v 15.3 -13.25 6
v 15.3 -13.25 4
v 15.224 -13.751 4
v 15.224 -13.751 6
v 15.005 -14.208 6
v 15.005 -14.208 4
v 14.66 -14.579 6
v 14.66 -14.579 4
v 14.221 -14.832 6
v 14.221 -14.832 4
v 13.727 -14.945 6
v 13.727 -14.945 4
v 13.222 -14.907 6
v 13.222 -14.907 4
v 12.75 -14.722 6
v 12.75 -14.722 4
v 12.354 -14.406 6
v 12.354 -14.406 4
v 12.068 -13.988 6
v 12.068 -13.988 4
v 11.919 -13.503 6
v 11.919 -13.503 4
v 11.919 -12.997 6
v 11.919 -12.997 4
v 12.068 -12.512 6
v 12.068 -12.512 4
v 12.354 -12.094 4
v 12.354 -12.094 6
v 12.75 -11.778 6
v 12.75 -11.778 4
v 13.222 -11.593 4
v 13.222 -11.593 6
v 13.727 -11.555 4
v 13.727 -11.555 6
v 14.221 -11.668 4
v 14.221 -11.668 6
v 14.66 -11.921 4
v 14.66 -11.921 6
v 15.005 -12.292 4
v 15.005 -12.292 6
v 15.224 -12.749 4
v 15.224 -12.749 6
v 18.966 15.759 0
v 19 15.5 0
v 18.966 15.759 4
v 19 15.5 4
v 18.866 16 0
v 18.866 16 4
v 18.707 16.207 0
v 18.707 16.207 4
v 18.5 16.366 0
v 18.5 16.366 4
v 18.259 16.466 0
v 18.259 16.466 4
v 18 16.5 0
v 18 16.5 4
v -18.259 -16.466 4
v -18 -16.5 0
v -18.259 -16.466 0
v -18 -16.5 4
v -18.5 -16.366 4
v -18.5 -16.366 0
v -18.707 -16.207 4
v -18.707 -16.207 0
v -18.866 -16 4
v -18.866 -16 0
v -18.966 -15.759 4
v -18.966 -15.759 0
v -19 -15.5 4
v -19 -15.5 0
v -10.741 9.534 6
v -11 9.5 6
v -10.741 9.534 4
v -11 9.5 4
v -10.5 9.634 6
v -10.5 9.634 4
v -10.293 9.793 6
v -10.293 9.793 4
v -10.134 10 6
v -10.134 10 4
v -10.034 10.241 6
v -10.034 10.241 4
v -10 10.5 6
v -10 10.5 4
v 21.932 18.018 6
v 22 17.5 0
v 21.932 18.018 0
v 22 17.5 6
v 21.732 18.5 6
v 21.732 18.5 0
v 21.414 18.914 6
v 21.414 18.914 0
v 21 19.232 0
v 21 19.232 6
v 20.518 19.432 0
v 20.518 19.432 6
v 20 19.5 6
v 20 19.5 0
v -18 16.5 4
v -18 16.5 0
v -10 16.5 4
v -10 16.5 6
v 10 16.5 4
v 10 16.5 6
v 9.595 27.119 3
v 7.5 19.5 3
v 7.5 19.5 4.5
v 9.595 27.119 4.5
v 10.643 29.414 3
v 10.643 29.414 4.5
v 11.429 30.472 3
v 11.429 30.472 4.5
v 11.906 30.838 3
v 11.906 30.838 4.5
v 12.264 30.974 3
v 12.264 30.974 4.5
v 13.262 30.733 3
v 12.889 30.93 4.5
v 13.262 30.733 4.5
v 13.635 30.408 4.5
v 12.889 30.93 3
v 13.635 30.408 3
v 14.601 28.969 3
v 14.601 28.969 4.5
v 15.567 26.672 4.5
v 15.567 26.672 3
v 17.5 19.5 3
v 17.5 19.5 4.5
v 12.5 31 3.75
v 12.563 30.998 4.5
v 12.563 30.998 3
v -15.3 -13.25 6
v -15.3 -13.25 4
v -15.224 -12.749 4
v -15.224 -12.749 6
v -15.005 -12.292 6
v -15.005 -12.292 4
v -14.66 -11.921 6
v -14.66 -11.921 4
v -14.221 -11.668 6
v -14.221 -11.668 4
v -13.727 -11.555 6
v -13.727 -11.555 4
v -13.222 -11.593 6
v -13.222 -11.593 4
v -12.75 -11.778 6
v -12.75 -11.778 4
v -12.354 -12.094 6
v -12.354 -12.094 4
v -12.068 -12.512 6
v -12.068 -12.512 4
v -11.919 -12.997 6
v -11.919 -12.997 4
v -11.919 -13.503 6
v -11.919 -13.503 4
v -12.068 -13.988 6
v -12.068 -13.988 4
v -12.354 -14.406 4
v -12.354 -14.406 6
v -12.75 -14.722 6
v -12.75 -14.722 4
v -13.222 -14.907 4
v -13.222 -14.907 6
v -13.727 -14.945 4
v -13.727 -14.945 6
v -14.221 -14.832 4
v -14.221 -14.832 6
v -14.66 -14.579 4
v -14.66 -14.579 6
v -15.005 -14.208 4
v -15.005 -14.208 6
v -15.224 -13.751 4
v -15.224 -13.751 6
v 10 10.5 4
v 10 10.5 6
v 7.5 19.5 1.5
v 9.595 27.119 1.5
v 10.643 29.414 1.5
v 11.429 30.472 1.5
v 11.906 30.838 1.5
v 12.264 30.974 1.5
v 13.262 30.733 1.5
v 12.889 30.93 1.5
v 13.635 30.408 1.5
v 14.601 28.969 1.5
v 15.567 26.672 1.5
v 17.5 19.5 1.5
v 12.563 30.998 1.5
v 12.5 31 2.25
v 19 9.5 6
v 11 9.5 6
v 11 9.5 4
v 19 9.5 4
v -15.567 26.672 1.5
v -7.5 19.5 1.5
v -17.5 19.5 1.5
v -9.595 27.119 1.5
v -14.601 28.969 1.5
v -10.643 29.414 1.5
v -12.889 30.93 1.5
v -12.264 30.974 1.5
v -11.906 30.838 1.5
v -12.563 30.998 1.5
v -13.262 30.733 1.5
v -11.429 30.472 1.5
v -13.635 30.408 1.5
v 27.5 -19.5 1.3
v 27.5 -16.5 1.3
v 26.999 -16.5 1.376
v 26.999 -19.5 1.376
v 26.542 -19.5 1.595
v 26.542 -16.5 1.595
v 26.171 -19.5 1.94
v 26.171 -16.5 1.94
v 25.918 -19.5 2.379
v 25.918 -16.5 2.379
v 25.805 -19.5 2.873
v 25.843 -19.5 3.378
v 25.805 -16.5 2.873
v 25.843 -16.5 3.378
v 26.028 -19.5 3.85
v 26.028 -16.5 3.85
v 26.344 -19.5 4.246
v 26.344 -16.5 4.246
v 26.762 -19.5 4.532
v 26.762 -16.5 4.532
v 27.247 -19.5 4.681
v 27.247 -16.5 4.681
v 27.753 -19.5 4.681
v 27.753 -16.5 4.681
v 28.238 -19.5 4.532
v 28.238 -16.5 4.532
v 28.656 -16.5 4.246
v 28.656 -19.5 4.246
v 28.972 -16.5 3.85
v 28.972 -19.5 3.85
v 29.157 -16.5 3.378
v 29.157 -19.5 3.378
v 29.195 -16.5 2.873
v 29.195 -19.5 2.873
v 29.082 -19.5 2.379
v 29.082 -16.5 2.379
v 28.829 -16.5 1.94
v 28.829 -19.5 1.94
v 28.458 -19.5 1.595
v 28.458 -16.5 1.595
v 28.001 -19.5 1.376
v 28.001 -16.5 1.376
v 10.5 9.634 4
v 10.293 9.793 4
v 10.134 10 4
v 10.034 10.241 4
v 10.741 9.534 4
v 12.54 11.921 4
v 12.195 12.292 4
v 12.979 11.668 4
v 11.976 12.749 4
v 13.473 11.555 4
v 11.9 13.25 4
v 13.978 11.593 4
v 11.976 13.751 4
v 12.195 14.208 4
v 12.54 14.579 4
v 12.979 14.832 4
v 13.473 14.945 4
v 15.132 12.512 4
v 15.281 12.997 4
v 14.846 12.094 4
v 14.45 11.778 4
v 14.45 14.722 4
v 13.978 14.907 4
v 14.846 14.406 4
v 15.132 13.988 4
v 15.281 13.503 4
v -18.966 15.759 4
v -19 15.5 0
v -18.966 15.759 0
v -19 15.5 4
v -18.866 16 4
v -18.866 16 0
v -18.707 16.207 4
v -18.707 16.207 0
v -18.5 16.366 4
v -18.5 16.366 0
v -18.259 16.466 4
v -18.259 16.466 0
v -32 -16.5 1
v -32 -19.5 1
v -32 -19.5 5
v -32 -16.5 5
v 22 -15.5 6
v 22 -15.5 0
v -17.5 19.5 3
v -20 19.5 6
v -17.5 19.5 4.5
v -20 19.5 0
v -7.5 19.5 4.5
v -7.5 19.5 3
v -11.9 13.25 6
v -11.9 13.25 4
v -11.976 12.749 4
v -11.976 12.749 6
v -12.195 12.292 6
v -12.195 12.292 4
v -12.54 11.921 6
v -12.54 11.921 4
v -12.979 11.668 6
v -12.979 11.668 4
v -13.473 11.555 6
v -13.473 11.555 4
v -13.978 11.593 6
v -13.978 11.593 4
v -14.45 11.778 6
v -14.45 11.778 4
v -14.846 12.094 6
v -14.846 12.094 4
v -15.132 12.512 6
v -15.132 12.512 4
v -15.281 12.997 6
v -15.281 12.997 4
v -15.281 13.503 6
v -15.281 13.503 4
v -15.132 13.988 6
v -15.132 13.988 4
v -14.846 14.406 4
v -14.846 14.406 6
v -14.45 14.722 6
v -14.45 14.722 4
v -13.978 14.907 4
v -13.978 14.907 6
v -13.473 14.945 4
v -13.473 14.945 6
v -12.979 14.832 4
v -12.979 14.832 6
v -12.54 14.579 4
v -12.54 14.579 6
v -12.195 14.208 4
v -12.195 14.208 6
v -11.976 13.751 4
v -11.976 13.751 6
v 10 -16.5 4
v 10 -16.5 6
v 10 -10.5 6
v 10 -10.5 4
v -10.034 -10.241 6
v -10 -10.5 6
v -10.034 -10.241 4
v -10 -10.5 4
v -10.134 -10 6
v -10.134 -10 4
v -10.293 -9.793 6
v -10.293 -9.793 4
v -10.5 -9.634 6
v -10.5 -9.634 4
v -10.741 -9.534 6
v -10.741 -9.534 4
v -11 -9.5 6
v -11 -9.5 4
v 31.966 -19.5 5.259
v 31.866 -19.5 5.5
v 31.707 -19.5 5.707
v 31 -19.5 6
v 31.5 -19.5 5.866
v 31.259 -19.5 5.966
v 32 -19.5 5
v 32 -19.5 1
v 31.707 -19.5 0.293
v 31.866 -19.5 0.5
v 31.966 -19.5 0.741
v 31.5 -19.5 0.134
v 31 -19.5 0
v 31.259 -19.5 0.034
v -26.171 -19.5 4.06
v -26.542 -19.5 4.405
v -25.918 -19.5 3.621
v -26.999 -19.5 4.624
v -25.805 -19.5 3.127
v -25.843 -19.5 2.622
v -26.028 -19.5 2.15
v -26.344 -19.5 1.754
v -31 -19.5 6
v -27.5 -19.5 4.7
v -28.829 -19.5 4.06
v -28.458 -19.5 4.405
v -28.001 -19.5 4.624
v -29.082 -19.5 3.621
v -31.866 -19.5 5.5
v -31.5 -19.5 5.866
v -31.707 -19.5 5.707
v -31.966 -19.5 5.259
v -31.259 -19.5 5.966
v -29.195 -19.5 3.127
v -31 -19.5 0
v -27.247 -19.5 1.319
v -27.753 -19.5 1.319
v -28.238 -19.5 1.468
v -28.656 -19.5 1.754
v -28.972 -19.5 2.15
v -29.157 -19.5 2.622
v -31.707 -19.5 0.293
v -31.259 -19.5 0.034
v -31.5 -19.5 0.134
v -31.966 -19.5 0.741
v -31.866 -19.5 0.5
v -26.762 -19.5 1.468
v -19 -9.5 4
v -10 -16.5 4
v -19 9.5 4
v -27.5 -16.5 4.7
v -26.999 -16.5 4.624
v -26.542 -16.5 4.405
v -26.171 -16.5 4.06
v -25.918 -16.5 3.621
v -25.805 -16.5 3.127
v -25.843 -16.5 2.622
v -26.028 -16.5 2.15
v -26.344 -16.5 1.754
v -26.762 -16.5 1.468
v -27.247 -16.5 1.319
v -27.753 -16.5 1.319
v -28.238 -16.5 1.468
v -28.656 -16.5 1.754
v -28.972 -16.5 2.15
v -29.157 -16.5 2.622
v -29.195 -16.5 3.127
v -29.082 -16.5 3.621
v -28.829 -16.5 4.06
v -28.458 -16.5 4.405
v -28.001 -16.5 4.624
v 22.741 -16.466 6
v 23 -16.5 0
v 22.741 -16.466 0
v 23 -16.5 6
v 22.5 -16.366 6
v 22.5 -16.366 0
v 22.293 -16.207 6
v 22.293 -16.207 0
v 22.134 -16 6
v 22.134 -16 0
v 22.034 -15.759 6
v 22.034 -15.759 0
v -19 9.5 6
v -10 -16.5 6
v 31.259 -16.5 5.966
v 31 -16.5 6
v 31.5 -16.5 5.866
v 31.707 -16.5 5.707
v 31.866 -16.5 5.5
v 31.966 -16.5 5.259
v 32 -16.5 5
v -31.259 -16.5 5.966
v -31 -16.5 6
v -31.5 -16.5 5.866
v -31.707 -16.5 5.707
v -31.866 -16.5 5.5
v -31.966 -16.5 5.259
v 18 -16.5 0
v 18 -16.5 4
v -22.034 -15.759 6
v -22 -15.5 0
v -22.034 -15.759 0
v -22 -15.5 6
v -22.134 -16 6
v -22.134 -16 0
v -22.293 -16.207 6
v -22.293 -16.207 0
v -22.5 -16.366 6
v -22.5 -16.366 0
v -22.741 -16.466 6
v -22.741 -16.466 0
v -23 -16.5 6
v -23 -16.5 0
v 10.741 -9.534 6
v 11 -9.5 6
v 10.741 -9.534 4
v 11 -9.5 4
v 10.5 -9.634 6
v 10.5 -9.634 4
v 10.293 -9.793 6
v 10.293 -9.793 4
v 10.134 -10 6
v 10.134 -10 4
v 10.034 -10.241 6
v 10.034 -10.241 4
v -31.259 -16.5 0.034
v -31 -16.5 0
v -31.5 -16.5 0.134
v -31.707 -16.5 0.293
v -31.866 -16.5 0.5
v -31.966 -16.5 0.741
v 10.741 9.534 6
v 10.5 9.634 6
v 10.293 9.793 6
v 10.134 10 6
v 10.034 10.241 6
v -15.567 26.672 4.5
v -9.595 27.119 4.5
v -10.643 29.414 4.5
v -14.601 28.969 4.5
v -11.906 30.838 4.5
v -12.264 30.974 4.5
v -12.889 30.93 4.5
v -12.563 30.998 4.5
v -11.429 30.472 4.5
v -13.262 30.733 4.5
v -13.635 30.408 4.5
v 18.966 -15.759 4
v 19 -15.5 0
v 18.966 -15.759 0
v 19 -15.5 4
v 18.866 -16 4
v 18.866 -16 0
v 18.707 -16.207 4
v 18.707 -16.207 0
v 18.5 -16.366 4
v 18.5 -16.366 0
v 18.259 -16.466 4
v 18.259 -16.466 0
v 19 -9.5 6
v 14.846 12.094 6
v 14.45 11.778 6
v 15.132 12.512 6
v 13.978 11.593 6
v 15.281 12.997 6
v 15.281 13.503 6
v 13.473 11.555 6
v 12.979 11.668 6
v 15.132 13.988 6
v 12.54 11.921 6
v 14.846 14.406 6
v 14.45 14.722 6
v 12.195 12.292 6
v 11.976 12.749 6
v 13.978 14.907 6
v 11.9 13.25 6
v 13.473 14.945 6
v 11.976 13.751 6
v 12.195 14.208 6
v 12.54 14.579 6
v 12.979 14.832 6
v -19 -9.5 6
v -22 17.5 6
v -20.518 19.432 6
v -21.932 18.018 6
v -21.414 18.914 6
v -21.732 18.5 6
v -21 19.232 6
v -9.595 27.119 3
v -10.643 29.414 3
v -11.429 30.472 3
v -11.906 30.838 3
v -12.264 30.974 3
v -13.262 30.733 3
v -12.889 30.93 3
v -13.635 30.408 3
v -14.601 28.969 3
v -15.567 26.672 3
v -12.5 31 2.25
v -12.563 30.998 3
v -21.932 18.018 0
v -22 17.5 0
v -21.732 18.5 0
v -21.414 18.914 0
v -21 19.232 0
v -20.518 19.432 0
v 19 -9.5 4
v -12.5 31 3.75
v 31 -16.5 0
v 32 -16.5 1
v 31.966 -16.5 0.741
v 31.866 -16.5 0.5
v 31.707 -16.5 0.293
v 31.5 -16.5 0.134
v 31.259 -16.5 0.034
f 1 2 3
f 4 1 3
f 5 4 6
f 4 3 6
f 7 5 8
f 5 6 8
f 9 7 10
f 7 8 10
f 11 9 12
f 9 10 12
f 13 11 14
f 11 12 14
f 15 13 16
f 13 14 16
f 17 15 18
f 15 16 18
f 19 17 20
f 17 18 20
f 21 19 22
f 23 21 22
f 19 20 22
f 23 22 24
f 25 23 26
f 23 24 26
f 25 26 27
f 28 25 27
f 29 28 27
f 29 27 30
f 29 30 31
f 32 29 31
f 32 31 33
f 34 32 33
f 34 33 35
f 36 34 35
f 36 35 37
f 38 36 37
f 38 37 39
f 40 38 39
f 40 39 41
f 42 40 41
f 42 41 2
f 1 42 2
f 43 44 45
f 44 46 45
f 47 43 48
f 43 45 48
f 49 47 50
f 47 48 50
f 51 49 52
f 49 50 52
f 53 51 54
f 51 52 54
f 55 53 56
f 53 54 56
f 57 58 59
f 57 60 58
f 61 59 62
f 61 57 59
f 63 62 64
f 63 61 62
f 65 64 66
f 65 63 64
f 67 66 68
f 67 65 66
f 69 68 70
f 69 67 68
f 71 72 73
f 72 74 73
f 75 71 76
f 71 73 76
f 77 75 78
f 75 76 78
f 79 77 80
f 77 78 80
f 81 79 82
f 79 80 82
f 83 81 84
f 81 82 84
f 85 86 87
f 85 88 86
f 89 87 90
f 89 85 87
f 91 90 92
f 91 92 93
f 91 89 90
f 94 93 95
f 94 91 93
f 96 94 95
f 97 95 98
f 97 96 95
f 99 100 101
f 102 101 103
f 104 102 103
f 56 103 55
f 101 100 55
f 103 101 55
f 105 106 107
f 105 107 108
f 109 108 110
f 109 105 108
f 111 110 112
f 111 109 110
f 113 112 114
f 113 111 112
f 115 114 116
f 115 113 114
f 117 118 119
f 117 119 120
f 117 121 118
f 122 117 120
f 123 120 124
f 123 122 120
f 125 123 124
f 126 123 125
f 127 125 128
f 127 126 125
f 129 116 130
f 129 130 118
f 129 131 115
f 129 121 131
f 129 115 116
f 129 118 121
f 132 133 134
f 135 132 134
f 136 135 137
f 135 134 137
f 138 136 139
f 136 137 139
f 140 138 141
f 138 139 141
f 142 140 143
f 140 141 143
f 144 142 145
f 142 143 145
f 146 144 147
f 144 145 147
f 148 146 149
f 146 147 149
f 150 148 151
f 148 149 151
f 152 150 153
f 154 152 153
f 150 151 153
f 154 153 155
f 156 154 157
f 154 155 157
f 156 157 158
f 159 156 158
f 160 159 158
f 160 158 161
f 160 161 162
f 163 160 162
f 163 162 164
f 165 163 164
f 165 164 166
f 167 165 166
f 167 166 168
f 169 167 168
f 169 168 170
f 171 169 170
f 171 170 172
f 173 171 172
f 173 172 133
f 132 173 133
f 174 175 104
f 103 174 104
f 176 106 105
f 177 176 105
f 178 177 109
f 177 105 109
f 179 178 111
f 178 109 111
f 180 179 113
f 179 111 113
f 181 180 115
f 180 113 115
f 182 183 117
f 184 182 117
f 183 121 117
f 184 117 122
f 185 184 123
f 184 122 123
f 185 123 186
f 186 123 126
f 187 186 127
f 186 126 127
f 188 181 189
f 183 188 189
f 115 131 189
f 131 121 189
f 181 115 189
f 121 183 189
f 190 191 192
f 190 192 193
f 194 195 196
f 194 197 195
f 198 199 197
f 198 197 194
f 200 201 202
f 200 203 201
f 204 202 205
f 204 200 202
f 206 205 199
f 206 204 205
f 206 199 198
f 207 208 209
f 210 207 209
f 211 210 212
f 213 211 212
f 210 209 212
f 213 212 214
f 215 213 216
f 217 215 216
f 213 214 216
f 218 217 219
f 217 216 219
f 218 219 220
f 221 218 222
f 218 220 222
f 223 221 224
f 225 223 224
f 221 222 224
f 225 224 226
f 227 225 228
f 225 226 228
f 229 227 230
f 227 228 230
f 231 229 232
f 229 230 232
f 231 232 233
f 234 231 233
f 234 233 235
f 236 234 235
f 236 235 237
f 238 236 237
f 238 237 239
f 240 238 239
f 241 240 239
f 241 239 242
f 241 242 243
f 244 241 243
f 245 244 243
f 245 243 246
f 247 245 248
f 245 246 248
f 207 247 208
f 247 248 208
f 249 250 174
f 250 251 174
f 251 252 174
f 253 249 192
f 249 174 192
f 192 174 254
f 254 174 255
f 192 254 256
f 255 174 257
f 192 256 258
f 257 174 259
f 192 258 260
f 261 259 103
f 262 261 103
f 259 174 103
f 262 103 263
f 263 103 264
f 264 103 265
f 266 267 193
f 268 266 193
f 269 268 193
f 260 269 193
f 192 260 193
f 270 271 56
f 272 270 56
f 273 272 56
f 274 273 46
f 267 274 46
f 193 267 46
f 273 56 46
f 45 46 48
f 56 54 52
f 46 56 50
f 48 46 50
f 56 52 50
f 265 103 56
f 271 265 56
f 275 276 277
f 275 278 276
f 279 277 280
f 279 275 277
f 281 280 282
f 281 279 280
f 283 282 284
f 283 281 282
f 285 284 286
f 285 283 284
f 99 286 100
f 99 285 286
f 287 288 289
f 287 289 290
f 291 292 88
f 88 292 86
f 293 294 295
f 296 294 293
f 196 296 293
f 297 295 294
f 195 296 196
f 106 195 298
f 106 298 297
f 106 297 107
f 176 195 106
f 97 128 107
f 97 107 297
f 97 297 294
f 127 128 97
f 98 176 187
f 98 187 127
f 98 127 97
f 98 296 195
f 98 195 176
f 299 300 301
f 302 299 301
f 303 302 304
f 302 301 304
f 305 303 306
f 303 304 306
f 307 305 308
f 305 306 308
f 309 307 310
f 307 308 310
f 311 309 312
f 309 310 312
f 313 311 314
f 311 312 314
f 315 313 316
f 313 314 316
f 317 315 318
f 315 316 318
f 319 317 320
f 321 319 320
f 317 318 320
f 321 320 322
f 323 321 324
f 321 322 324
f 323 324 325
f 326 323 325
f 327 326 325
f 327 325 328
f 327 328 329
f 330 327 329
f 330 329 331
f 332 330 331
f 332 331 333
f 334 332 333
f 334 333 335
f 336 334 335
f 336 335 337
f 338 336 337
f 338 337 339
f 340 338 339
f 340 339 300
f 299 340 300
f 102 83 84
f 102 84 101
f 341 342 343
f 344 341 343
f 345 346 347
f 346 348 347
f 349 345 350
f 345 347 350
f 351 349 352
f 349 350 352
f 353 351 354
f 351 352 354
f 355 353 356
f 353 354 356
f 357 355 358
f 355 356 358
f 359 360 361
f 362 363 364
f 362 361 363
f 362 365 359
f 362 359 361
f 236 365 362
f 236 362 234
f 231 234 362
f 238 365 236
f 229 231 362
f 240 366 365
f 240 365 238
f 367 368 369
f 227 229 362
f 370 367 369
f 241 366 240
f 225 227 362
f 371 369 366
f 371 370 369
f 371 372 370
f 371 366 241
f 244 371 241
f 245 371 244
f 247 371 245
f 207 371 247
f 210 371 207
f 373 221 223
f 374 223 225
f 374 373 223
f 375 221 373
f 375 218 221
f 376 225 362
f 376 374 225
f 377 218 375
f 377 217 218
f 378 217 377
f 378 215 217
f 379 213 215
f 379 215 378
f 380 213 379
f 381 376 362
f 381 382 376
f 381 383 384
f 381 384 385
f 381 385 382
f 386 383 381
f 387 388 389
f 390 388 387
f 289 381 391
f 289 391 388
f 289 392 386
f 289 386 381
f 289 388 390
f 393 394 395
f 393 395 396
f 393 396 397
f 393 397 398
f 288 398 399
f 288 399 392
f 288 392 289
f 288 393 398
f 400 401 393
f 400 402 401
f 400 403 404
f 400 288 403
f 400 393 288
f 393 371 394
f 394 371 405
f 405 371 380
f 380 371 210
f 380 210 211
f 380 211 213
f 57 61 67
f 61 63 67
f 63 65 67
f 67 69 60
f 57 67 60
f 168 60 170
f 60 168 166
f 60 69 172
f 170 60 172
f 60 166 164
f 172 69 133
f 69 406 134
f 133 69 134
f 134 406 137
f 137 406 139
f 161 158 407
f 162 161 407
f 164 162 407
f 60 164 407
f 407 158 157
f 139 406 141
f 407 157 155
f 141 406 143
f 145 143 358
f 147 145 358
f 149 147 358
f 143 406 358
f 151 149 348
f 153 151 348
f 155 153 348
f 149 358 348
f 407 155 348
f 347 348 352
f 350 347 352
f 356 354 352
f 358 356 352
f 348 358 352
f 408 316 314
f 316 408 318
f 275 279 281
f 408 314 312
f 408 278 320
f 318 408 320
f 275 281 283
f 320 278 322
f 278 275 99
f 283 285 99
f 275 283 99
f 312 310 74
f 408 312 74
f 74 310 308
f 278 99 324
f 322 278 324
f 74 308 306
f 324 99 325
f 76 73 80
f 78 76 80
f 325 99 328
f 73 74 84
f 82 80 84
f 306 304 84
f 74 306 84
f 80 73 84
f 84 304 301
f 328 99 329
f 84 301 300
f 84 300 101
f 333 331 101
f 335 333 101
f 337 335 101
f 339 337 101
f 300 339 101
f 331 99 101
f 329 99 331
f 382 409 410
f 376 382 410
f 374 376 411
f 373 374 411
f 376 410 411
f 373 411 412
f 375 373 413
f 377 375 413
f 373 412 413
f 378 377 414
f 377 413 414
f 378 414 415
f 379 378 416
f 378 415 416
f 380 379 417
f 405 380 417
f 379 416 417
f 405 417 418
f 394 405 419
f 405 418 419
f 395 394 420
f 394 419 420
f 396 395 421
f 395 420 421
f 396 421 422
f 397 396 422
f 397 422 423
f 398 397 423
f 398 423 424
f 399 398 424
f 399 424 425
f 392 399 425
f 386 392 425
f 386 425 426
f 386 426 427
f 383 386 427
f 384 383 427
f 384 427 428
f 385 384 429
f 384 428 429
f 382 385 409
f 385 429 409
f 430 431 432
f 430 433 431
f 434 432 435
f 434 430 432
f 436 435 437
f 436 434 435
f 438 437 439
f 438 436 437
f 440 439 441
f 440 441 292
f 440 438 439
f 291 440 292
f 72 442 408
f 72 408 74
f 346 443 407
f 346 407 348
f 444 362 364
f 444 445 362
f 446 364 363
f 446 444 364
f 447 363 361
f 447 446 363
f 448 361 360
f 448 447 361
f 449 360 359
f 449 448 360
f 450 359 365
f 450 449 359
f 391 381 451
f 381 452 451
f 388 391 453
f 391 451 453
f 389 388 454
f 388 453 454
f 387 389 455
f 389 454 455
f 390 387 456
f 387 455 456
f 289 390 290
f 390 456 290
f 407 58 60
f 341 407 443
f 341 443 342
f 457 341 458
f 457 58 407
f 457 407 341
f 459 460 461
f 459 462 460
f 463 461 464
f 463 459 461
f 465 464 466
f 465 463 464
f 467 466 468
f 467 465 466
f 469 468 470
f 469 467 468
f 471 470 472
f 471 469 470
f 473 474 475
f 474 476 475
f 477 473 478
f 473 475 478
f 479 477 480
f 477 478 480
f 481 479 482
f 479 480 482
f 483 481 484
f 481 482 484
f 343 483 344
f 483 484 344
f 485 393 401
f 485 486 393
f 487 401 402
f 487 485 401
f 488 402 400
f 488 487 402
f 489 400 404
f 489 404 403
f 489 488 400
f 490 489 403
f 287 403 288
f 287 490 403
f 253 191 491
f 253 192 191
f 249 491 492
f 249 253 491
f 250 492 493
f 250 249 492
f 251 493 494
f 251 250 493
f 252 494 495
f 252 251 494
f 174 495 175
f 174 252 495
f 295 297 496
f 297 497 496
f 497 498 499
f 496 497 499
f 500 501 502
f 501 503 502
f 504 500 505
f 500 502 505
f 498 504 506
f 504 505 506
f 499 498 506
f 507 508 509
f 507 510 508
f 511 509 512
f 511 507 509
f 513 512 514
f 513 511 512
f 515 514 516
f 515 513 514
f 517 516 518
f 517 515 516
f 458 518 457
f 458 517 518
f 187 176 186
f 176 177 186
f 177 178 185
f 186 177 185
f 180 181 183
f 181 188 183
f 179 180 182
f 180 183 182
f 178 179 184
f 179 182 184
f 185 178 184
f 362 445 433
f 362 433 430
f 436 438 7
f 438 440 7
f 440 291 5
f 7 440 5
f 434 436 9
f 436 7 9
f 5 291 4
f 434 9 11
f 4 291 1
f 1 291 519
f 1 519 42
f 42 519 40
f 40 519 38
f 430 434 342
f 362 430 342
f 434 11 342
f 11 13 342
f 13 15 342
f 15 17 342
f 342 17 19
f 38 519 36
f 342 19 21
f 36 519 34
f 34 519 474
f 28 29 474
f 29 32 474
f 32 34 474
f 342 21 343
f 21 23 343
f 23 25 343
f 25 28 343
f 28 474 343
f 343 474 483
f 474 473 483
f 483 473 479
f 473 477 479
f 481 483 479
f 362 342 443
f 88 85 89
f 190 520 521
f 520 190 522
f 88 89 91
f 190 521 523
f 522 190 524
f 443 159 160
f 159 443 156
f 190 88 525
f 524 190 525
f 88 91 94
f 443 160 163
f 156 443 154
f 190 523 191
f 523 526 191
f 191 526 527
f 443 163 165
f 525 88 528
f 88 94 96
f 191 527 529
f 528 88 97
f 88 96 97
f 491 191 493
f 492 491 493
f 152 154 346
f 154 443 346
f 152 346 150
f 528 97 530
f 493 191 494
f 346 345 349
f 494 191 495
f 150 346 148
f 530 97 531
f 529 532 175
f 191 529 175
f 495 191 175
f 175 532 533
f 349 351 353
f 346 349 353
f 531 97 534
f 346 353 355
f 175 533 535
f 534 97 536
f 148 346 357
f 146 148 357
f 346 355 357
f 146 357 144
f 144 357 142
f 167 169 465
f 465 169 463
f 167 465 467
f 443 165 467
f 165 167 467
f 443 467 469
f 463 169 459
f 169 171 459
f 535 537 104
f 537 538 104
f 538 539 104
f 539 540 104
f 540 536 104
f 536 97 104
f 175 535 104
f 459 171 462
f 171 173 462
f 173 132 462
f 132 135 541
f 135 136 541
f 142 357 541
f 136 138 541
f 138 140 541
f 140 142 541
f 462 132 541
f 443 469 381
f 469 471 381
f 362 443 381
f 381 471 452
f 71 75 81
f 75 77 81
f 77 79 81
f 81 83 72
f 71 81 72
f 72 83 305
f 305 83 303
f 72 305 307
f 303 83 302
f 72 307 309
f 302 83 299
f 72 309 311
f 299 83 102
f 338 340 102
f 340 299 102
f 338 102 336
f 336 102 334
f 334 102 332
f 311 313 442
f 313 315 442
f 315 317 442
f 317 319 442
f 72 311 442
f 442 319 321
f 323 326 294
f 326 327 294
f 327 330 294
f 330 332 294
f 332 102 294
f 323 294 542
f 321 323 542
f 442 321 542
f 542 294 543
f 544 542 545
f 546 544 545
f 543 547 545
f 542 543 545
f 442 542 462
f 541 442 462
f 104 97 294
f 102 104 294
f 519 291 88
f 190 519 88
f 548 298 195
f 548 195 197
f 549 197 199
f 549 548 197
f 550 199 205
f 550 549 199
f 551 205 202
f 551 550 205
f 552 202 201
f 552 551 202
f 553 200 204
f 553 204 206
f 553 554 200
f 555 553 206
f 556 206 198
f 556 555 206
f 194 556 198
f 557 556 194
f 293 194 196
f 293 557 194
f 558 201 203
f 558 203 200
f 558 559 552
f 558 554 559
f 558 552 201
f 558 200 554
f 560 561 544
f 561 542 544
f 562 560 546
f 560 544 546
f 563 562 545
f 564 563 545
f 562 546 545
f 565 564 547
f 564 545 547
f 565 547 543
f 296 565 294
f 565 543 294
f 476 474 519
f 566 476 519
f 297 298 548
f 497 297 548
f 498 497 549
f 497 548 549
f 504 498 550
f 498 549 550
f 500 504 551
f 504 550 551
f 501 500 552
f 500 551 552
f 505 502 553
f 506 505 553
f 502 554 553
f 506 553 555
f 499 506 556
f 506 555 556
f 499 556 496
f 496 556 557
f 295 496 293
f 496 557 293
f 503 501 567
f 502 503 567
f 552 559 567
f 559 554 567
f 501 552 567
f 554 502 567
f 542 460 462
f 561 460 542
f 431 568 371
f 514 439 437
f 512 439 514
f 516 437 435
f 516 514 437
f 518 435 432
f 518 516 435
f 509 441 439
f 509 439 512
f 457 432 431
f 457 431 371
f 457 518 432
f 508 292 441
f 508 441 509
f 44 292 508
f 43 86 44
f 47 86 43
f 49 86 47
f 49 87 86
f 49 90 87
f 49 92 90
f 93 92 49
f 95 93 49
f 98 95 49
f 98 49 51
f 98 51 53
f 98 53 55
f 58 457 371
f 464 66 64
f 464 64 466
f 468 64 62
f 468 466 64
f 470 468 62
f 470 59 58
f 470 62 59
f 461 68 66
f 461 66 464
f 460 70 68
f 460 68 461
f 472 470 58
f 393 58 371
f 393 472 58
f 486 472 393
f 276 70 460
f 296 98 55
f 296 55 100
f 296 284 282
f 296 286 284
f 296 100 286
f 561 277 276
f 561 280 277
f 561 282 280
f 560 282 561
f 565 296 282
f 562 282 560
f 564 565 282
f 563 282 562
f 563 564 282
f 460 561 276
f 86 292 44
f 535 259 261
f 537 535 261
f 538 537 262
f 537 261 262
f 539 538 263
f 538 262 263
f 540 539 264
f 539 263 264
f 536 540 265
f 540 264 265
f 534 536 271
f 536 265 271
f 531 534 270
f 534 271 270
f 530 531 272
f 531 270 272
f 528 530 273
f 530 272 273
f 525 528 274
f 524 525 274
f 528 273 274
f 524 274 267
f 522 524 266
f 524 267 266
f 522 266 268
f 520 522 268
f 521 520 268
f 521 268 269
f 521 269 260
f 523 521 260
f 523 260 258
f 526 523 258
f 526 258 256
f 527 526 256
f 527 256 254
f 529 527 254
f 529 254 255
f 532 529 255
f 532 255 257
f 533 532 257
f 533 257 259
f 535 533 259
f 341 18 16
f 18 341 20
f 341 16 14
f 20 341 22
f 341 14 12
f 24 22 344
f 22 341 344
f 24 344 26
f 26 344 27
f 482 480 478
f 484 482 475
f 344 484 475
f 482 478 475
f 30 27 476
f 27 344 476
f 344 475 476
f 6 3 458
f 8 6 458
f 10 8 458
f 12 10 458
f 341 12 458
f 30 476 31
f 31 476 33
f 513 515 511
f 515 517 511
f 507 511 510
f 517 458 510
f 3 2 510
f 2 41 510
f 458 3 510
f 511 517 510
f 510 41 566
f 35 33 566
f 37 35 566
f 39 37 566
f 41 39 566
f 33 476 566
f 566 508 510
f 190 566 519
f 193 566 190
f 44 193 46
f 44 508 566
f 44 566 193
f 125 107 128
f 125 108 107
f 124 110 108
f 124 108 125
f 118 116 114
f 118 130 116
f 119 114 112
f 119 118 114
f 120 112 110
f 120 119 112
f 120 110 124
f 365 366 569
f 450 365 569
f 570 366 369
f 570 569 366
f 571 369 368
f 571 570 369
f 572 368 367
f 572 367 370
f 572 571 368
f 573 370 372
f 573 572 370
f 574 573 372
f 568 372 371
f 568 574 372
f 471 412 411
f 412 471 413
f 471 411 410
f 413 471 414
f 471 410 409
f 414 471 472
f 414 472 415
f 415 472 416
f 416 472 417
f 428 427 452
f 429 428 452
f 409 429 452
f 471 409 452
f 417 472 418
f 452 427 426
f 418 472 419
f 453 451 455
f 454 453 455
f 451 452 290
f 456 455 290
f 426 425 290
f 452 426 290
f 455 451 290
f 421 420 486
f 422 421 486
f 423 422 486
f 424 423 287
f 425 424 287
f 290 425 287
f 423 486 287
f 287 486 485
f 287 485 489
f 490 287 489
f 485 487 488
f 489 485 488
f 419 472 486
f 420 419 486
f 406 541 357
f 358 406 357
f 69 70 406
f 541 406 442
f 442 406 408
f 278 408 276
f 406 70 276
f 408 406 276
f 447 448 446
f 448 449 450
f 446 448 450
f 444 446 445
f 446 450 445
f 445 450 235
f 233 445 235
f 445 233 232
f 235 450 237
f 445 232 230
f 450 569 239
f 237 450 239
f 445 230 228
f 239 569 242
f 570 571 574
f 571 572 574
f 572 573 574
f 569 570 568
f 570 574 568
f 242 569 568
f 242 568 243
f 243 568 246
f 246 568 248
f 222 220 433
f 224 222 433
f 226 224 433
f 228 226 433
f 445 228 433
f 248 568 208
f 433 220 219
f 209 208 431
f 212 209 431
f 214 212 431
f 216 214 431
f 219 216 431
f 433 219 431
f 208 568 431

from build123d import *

# Parameters (mm, degrees)
SKETCH_1_W          = 44
SKETCH_1_H          = 39
SKETCH_1_W_2        = 38
SKETCH_1_H_2        = 33
EXTRUDE_1_DEPTH     = 6
SKETCH_2_W          = 9
SKETCH_2_H          = 7
EXTRUDE_2_DEPTH     = 2
SKETCH_3_R          = 1.7
CUT_EXTRUDE_1_DEPTH = 30.669007398
EXTRUDE_3_DEPTH     = 1.5
SKETCH_5_W          = 10
SKETCH_5_H          = 3
EXTRUDE_4_DEPTH     = 6
FILLET_3_R          = 1
FILLET_4_R          = 2
SKETCH_6_R          = 1.7
CUT_EXTRUDE_2_DEPTH = 3


with BuildPart() as part:
    # 草图1 → 凸台-拉伸1 (new body)
    with BuildSketch(Plane.XY):
        Rectangle(SKETCH_1_W, SKETCH_1_H)
        Rectangle(SKETCH_1_W_2, SKETCH_1_H_2, mode=Mode.SUBTRACT)
    extrude(amount=EXTRUDE_1_DEPTH)

    # 草图2 → 凸台-拉伸2 (add)
    with BuildSketch(Plane.XY.offset(6)):
        with Locations((14.5, 13)):
            Rectangle(SKETCH_2_W, SKETCH_2_H)
        with Locations((-14.5, 13)):
            Rectangle(SKETCH_2_W, SKETCH_2_H)
        with Locations((-14.5, -13)):
            Rectangle(SKETCH_2_W, SKETCH_2_H)
        with Locations((14.5, -13)):
            Rectangle(SKETCH_2_W, SKETCH_2_H)
    extrude(amount=-EXTRUDE_2_DEPTH)

    # 草图3 → 切除-拉伸1 (cut, through all)
    with BuildSketch(Plane(origin=(0, 0, 4), x_dir=(-1, 0, 0), z_dir=(0, 0, -1))):
        with Locations((-13.6, 13.25)):
            Circle(SKETCH_3_R)
        with Locations(Location((13.6, 13.25, 0), (0, 0, 180))):
            Circle(SKETCH_3_R)
        with Locations((13.6, -13.25)):
            Circle(SKETCH_3_R)
        with Locations(Location((-13.6, -13.25, 0), (0, 0, 180))):
            Circle(SKETCH_3_R)
    extrude(amount=-CUT_EXTRUDE_1_DEPTH, mode=Mode.SUBTRACT)

    # 草图4 → 凸台-拉伸3 (add, symmetric)
    with BuildSketch(Plane(origin=(0, 0, 3), x_dir=(-1, 0, 0), z_dir=(0, 0, -1))):
        with BuildLine():
            Line((7.5, 19.5), (17.5, 19.5))
            add(Edge.make_bspline(
                [(7.5, 19.5), (12.5, 42.5), (17.5, 19.5)],
                knots=[0, 0, 0, 1, 1, 1], degree=2))
        make_face()
        with BuildLine():
            Line((-7.5, 19.5), (-17.5, 19.5))
            add(Edge.make_bspline(
                [(-7.5, 19.5), (-12.5, 42.5), (-17.5, 19.5)],
                knots=[0, 0, 0, 1, 1, 1], degree=2))
        make_face()
    extrude(amount=EXTRUDE_3_DEPTH, both=True)

    # 草图5 → 凸台-拉伸4 (add)
    with BuildSketch(Plane(origin=(0, 0, 0), x_dir=(-1, 0, 0), z_dir=(0, 0, -1))):
        with Locations((27, -18)):
            Rectangle(SKETCH_5_W, SKETCH_5_H)
        with Locations((-27, -18)):
            Rectangle(SKETCH_5_W, SKETCH_5_H)
    extrude(amount=-EXTRUDE_4_DEPTH)

    # 圆角3
    fillet_3_edges = [part.edges().sort_by_distance(p)[0] for p in [
        (-22, -16.5, 3),
        (-32, -18, 0),
        (-32, -18, 6),
        (22, -16.5, 3),
        (32, -18, 0),
        (32, -18, 6),
        (19, 16.5, 2),
        (10, 9.5, 5),
        (-19, 16.5, 2),
        (-10, 9.5, 5),
        (-19, -16.5, 2),
        (-10, -9.5, 5),
        (19, -16.5, 2),
        (10, -9.5, 5),
    ]]
    fillet(fillet_3_edges, radius=FILLET_3_R)

    # 圆角4
    fillet_4_edges = [part.edges().sort_by_distance(p)[0] for p in [
        (-22, 19.5, 3),
        (22, 19.5, 3),
    ]]
    fillet(fillet_4_edges, radius=FILLET_4_R)

    # 草图6 → 切除-拉伸2 (cut)
    with BuildSketch(Plane(origin=(0, -16.5, 0), x_dir=(1, 0, 0), z_dir=(0, 1, 0))):
        with Locations(Location((-27.5, -3, 0), (0, 0, 270))):
            Circle(SKETCH_6_R)
        with Locations(Location((27.5, -3, 0), (0, 0, 90))):
            Circle(SKETCH_6_R)
    extrude(amount=-CUT_EXTRUDE_2_DEPTH, mode=Mode.SUBTRACT)


solid = part.part
